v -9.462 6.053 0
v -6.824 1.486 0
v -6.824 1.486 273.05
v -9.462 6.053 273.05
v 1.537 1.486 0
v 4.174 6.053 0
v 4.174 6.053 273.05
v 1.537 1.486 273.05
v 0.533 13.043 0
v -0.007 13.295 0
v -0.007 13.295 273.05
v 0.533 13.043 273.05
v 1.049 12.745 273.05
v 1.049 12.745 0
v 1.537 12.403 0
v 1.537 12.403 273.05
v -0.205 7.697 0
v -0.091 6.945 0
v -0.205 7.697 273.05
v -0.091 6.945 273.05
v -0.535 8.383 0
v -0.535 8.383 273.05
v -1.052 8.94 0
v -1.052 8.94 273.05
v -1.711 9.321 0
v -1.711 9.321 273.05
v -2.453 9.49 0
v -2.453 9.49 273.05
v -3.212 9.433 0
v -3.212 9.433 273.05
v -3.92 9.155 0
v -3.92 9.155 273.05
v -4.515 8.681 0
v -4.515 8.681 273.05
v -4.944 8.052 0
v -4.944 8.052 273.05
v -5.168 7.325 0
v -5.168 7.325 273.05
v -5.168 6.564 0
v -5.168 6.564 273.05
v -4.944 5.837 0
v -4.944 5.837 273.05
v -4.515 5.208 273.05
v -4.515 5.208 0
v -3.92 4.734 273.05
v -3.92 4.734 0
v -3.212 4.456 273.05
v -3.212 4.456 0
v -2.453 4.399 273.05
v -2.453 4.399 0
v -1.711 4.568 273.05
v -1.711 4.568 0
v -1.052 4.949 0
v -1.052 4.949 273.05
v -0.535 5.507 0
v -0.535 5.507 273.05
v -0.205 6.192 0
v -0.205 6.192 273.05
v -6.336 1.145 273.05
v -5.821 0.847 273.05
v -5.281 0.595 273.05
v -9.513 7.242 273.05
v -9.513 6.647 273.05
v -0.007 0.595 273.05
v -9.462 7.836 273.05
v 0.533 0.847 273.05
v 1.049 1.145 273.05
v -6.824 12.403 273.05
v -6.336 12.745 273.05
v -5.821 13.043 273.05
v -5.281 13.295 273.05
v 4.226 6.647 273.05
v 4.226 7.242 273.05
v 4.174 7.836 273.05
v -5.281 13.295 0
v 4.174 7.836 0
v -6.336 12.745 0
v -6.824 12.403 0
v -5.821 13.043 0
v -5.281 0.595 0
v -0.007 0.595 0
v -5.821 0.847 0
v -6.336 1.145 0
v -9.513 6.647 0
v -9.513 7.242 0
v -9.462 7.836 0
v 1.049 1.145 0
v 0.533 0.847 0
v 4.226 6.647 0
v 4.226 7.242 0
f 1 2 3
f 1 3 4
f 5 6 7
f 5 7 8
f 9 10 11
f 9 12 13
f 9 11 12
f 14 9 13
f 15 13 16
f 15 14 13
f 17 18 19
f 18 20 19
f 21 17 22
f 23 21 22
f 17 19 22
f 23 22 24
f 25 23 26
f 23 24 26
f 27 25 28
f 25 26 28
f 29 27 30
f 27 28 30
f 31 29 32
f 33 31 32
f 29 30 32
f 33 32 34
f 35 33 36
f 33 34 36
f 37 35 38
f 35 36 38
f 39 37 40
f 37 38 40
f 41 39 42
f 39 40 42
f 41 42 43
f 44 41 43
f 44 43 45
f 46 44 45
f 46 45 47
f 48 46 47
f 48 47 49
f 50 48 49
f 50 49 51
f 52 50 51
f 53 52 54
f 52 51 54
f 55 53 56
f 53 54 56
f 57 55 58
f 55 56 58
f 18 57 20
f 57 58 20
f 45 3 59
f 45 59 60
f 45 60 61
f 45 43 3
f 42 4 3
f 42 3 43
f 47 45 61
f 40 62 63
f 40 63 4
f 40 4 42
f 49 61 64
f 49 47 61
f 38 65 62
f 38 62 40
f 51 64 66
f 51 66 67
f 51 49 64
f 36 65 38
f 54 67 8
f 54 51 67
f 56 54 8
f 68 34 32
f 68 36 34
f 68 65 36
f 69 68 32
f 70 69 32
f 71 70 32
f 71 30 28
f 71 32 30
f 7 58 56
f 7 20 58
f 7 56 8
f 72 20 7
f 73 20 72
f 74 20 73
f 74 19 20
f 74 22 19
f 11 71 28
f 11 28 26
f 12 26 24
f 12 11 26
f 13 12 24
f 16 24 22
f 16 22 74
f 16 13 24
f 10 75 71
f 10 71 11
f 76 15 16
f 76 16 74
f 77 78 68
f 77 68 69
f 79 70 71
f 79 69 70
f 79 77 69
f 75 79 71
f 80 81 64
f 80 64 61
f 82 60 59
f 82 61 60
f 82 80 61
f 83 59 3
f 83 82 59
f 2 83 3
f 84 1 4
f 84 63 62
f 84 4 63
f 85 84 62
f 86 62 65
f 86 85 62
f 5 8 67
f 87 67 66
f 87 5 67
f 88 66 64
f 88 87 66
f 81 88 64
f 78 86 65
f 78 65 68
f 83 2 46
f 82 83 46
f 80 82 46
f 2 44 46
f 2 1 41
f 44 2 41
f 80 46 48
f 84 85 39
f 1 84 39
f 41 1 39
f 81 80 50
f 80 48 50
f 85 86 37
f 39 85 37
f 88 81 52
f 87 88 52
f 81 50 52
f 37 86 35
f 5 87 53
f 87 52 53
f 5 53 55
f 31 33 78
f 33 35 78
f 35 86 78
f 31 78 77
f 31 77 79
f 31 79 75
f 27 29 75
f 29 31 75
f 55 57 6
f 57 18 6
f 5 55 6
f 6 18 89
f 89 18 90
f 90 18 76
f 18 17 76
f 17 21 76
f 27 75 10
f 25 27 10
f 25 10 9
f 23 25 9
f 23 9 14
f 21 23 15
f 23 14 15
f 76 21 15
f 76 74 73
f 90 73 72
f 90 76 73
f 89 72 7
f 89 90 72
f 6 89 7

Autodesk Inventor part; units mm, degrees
ref_plane "YZ Plane" through (0, 0, 0) normal (1, 0, 0) x (0, 1, 0)
ref_plane "XZ Plane" through (0, 0, 0) normal (0, 1, 0) x (-1, 0, 0)
ref_plane "XY Plane" through (0, 0, 0) normal (0, 0, 1) x (1, 0, 0)
sketch "Sketch1" plane through (0, 0, 0) normal (0, 0, 1) x (1, 0, 0)
  circle A0 centre (-2.6438, 6.9447) radius 6.8758
  line L0 (-9.4616, 7.8359) -> (-6.8245, 12.4034)
  line L1 (-6.8245, 1.4859) -> (-9.4616, 6.0534)
  line L2 (-0.0068, 0.5947) -> (-5.2808, 0.5947)
  line L3 (4.174, 6.0534) -> (1.537, 1.4859)
  line L4 (1.537, 12.4034) -> (4.174, 7.8359)
  line L5 (-5.2808, 13.2947) -> (-0.0068, 13.2947)
  point P0 (0, 0)
  point P1 (1.537, 1.4859)
  dimension "d0" = 13.7516
  dimension "d4" = 360
extrude "Extrusion1" add sketch "Sketch1" along normal blind 273.05 contours A0 L3 L2 L1 L0 L5 L4
sketch "Sketch2" plane through (0, 0, 273.05) normal (0, 0, 1) x (1, 0, 0)
  circle A0 centre (-2.6438, 6.9447) radius 2.5527
  line L0 (-5.2808, 0.5947) -> (-0.0068, 0.5947) projected
  line L1 (-2.6438, 6.9447) -> (-5.2808, 0.5947) construction
  line L2 (-2.6438, 6.9447) -> (-0.0068, 0.5947) construction
  point P0 (0, 0)
  dimension "d8" = 5.1054
  dimension "d9" = 6.35
extrude "Extrusion2" cut sketch "Sketch2" against normal blind 273.05
equation "\"d6\" = d5"
equation "\"d10\" = d5"
equation "\"d5\" = 273.05"
properties part number "10.75in THUNDERSHAFT"
